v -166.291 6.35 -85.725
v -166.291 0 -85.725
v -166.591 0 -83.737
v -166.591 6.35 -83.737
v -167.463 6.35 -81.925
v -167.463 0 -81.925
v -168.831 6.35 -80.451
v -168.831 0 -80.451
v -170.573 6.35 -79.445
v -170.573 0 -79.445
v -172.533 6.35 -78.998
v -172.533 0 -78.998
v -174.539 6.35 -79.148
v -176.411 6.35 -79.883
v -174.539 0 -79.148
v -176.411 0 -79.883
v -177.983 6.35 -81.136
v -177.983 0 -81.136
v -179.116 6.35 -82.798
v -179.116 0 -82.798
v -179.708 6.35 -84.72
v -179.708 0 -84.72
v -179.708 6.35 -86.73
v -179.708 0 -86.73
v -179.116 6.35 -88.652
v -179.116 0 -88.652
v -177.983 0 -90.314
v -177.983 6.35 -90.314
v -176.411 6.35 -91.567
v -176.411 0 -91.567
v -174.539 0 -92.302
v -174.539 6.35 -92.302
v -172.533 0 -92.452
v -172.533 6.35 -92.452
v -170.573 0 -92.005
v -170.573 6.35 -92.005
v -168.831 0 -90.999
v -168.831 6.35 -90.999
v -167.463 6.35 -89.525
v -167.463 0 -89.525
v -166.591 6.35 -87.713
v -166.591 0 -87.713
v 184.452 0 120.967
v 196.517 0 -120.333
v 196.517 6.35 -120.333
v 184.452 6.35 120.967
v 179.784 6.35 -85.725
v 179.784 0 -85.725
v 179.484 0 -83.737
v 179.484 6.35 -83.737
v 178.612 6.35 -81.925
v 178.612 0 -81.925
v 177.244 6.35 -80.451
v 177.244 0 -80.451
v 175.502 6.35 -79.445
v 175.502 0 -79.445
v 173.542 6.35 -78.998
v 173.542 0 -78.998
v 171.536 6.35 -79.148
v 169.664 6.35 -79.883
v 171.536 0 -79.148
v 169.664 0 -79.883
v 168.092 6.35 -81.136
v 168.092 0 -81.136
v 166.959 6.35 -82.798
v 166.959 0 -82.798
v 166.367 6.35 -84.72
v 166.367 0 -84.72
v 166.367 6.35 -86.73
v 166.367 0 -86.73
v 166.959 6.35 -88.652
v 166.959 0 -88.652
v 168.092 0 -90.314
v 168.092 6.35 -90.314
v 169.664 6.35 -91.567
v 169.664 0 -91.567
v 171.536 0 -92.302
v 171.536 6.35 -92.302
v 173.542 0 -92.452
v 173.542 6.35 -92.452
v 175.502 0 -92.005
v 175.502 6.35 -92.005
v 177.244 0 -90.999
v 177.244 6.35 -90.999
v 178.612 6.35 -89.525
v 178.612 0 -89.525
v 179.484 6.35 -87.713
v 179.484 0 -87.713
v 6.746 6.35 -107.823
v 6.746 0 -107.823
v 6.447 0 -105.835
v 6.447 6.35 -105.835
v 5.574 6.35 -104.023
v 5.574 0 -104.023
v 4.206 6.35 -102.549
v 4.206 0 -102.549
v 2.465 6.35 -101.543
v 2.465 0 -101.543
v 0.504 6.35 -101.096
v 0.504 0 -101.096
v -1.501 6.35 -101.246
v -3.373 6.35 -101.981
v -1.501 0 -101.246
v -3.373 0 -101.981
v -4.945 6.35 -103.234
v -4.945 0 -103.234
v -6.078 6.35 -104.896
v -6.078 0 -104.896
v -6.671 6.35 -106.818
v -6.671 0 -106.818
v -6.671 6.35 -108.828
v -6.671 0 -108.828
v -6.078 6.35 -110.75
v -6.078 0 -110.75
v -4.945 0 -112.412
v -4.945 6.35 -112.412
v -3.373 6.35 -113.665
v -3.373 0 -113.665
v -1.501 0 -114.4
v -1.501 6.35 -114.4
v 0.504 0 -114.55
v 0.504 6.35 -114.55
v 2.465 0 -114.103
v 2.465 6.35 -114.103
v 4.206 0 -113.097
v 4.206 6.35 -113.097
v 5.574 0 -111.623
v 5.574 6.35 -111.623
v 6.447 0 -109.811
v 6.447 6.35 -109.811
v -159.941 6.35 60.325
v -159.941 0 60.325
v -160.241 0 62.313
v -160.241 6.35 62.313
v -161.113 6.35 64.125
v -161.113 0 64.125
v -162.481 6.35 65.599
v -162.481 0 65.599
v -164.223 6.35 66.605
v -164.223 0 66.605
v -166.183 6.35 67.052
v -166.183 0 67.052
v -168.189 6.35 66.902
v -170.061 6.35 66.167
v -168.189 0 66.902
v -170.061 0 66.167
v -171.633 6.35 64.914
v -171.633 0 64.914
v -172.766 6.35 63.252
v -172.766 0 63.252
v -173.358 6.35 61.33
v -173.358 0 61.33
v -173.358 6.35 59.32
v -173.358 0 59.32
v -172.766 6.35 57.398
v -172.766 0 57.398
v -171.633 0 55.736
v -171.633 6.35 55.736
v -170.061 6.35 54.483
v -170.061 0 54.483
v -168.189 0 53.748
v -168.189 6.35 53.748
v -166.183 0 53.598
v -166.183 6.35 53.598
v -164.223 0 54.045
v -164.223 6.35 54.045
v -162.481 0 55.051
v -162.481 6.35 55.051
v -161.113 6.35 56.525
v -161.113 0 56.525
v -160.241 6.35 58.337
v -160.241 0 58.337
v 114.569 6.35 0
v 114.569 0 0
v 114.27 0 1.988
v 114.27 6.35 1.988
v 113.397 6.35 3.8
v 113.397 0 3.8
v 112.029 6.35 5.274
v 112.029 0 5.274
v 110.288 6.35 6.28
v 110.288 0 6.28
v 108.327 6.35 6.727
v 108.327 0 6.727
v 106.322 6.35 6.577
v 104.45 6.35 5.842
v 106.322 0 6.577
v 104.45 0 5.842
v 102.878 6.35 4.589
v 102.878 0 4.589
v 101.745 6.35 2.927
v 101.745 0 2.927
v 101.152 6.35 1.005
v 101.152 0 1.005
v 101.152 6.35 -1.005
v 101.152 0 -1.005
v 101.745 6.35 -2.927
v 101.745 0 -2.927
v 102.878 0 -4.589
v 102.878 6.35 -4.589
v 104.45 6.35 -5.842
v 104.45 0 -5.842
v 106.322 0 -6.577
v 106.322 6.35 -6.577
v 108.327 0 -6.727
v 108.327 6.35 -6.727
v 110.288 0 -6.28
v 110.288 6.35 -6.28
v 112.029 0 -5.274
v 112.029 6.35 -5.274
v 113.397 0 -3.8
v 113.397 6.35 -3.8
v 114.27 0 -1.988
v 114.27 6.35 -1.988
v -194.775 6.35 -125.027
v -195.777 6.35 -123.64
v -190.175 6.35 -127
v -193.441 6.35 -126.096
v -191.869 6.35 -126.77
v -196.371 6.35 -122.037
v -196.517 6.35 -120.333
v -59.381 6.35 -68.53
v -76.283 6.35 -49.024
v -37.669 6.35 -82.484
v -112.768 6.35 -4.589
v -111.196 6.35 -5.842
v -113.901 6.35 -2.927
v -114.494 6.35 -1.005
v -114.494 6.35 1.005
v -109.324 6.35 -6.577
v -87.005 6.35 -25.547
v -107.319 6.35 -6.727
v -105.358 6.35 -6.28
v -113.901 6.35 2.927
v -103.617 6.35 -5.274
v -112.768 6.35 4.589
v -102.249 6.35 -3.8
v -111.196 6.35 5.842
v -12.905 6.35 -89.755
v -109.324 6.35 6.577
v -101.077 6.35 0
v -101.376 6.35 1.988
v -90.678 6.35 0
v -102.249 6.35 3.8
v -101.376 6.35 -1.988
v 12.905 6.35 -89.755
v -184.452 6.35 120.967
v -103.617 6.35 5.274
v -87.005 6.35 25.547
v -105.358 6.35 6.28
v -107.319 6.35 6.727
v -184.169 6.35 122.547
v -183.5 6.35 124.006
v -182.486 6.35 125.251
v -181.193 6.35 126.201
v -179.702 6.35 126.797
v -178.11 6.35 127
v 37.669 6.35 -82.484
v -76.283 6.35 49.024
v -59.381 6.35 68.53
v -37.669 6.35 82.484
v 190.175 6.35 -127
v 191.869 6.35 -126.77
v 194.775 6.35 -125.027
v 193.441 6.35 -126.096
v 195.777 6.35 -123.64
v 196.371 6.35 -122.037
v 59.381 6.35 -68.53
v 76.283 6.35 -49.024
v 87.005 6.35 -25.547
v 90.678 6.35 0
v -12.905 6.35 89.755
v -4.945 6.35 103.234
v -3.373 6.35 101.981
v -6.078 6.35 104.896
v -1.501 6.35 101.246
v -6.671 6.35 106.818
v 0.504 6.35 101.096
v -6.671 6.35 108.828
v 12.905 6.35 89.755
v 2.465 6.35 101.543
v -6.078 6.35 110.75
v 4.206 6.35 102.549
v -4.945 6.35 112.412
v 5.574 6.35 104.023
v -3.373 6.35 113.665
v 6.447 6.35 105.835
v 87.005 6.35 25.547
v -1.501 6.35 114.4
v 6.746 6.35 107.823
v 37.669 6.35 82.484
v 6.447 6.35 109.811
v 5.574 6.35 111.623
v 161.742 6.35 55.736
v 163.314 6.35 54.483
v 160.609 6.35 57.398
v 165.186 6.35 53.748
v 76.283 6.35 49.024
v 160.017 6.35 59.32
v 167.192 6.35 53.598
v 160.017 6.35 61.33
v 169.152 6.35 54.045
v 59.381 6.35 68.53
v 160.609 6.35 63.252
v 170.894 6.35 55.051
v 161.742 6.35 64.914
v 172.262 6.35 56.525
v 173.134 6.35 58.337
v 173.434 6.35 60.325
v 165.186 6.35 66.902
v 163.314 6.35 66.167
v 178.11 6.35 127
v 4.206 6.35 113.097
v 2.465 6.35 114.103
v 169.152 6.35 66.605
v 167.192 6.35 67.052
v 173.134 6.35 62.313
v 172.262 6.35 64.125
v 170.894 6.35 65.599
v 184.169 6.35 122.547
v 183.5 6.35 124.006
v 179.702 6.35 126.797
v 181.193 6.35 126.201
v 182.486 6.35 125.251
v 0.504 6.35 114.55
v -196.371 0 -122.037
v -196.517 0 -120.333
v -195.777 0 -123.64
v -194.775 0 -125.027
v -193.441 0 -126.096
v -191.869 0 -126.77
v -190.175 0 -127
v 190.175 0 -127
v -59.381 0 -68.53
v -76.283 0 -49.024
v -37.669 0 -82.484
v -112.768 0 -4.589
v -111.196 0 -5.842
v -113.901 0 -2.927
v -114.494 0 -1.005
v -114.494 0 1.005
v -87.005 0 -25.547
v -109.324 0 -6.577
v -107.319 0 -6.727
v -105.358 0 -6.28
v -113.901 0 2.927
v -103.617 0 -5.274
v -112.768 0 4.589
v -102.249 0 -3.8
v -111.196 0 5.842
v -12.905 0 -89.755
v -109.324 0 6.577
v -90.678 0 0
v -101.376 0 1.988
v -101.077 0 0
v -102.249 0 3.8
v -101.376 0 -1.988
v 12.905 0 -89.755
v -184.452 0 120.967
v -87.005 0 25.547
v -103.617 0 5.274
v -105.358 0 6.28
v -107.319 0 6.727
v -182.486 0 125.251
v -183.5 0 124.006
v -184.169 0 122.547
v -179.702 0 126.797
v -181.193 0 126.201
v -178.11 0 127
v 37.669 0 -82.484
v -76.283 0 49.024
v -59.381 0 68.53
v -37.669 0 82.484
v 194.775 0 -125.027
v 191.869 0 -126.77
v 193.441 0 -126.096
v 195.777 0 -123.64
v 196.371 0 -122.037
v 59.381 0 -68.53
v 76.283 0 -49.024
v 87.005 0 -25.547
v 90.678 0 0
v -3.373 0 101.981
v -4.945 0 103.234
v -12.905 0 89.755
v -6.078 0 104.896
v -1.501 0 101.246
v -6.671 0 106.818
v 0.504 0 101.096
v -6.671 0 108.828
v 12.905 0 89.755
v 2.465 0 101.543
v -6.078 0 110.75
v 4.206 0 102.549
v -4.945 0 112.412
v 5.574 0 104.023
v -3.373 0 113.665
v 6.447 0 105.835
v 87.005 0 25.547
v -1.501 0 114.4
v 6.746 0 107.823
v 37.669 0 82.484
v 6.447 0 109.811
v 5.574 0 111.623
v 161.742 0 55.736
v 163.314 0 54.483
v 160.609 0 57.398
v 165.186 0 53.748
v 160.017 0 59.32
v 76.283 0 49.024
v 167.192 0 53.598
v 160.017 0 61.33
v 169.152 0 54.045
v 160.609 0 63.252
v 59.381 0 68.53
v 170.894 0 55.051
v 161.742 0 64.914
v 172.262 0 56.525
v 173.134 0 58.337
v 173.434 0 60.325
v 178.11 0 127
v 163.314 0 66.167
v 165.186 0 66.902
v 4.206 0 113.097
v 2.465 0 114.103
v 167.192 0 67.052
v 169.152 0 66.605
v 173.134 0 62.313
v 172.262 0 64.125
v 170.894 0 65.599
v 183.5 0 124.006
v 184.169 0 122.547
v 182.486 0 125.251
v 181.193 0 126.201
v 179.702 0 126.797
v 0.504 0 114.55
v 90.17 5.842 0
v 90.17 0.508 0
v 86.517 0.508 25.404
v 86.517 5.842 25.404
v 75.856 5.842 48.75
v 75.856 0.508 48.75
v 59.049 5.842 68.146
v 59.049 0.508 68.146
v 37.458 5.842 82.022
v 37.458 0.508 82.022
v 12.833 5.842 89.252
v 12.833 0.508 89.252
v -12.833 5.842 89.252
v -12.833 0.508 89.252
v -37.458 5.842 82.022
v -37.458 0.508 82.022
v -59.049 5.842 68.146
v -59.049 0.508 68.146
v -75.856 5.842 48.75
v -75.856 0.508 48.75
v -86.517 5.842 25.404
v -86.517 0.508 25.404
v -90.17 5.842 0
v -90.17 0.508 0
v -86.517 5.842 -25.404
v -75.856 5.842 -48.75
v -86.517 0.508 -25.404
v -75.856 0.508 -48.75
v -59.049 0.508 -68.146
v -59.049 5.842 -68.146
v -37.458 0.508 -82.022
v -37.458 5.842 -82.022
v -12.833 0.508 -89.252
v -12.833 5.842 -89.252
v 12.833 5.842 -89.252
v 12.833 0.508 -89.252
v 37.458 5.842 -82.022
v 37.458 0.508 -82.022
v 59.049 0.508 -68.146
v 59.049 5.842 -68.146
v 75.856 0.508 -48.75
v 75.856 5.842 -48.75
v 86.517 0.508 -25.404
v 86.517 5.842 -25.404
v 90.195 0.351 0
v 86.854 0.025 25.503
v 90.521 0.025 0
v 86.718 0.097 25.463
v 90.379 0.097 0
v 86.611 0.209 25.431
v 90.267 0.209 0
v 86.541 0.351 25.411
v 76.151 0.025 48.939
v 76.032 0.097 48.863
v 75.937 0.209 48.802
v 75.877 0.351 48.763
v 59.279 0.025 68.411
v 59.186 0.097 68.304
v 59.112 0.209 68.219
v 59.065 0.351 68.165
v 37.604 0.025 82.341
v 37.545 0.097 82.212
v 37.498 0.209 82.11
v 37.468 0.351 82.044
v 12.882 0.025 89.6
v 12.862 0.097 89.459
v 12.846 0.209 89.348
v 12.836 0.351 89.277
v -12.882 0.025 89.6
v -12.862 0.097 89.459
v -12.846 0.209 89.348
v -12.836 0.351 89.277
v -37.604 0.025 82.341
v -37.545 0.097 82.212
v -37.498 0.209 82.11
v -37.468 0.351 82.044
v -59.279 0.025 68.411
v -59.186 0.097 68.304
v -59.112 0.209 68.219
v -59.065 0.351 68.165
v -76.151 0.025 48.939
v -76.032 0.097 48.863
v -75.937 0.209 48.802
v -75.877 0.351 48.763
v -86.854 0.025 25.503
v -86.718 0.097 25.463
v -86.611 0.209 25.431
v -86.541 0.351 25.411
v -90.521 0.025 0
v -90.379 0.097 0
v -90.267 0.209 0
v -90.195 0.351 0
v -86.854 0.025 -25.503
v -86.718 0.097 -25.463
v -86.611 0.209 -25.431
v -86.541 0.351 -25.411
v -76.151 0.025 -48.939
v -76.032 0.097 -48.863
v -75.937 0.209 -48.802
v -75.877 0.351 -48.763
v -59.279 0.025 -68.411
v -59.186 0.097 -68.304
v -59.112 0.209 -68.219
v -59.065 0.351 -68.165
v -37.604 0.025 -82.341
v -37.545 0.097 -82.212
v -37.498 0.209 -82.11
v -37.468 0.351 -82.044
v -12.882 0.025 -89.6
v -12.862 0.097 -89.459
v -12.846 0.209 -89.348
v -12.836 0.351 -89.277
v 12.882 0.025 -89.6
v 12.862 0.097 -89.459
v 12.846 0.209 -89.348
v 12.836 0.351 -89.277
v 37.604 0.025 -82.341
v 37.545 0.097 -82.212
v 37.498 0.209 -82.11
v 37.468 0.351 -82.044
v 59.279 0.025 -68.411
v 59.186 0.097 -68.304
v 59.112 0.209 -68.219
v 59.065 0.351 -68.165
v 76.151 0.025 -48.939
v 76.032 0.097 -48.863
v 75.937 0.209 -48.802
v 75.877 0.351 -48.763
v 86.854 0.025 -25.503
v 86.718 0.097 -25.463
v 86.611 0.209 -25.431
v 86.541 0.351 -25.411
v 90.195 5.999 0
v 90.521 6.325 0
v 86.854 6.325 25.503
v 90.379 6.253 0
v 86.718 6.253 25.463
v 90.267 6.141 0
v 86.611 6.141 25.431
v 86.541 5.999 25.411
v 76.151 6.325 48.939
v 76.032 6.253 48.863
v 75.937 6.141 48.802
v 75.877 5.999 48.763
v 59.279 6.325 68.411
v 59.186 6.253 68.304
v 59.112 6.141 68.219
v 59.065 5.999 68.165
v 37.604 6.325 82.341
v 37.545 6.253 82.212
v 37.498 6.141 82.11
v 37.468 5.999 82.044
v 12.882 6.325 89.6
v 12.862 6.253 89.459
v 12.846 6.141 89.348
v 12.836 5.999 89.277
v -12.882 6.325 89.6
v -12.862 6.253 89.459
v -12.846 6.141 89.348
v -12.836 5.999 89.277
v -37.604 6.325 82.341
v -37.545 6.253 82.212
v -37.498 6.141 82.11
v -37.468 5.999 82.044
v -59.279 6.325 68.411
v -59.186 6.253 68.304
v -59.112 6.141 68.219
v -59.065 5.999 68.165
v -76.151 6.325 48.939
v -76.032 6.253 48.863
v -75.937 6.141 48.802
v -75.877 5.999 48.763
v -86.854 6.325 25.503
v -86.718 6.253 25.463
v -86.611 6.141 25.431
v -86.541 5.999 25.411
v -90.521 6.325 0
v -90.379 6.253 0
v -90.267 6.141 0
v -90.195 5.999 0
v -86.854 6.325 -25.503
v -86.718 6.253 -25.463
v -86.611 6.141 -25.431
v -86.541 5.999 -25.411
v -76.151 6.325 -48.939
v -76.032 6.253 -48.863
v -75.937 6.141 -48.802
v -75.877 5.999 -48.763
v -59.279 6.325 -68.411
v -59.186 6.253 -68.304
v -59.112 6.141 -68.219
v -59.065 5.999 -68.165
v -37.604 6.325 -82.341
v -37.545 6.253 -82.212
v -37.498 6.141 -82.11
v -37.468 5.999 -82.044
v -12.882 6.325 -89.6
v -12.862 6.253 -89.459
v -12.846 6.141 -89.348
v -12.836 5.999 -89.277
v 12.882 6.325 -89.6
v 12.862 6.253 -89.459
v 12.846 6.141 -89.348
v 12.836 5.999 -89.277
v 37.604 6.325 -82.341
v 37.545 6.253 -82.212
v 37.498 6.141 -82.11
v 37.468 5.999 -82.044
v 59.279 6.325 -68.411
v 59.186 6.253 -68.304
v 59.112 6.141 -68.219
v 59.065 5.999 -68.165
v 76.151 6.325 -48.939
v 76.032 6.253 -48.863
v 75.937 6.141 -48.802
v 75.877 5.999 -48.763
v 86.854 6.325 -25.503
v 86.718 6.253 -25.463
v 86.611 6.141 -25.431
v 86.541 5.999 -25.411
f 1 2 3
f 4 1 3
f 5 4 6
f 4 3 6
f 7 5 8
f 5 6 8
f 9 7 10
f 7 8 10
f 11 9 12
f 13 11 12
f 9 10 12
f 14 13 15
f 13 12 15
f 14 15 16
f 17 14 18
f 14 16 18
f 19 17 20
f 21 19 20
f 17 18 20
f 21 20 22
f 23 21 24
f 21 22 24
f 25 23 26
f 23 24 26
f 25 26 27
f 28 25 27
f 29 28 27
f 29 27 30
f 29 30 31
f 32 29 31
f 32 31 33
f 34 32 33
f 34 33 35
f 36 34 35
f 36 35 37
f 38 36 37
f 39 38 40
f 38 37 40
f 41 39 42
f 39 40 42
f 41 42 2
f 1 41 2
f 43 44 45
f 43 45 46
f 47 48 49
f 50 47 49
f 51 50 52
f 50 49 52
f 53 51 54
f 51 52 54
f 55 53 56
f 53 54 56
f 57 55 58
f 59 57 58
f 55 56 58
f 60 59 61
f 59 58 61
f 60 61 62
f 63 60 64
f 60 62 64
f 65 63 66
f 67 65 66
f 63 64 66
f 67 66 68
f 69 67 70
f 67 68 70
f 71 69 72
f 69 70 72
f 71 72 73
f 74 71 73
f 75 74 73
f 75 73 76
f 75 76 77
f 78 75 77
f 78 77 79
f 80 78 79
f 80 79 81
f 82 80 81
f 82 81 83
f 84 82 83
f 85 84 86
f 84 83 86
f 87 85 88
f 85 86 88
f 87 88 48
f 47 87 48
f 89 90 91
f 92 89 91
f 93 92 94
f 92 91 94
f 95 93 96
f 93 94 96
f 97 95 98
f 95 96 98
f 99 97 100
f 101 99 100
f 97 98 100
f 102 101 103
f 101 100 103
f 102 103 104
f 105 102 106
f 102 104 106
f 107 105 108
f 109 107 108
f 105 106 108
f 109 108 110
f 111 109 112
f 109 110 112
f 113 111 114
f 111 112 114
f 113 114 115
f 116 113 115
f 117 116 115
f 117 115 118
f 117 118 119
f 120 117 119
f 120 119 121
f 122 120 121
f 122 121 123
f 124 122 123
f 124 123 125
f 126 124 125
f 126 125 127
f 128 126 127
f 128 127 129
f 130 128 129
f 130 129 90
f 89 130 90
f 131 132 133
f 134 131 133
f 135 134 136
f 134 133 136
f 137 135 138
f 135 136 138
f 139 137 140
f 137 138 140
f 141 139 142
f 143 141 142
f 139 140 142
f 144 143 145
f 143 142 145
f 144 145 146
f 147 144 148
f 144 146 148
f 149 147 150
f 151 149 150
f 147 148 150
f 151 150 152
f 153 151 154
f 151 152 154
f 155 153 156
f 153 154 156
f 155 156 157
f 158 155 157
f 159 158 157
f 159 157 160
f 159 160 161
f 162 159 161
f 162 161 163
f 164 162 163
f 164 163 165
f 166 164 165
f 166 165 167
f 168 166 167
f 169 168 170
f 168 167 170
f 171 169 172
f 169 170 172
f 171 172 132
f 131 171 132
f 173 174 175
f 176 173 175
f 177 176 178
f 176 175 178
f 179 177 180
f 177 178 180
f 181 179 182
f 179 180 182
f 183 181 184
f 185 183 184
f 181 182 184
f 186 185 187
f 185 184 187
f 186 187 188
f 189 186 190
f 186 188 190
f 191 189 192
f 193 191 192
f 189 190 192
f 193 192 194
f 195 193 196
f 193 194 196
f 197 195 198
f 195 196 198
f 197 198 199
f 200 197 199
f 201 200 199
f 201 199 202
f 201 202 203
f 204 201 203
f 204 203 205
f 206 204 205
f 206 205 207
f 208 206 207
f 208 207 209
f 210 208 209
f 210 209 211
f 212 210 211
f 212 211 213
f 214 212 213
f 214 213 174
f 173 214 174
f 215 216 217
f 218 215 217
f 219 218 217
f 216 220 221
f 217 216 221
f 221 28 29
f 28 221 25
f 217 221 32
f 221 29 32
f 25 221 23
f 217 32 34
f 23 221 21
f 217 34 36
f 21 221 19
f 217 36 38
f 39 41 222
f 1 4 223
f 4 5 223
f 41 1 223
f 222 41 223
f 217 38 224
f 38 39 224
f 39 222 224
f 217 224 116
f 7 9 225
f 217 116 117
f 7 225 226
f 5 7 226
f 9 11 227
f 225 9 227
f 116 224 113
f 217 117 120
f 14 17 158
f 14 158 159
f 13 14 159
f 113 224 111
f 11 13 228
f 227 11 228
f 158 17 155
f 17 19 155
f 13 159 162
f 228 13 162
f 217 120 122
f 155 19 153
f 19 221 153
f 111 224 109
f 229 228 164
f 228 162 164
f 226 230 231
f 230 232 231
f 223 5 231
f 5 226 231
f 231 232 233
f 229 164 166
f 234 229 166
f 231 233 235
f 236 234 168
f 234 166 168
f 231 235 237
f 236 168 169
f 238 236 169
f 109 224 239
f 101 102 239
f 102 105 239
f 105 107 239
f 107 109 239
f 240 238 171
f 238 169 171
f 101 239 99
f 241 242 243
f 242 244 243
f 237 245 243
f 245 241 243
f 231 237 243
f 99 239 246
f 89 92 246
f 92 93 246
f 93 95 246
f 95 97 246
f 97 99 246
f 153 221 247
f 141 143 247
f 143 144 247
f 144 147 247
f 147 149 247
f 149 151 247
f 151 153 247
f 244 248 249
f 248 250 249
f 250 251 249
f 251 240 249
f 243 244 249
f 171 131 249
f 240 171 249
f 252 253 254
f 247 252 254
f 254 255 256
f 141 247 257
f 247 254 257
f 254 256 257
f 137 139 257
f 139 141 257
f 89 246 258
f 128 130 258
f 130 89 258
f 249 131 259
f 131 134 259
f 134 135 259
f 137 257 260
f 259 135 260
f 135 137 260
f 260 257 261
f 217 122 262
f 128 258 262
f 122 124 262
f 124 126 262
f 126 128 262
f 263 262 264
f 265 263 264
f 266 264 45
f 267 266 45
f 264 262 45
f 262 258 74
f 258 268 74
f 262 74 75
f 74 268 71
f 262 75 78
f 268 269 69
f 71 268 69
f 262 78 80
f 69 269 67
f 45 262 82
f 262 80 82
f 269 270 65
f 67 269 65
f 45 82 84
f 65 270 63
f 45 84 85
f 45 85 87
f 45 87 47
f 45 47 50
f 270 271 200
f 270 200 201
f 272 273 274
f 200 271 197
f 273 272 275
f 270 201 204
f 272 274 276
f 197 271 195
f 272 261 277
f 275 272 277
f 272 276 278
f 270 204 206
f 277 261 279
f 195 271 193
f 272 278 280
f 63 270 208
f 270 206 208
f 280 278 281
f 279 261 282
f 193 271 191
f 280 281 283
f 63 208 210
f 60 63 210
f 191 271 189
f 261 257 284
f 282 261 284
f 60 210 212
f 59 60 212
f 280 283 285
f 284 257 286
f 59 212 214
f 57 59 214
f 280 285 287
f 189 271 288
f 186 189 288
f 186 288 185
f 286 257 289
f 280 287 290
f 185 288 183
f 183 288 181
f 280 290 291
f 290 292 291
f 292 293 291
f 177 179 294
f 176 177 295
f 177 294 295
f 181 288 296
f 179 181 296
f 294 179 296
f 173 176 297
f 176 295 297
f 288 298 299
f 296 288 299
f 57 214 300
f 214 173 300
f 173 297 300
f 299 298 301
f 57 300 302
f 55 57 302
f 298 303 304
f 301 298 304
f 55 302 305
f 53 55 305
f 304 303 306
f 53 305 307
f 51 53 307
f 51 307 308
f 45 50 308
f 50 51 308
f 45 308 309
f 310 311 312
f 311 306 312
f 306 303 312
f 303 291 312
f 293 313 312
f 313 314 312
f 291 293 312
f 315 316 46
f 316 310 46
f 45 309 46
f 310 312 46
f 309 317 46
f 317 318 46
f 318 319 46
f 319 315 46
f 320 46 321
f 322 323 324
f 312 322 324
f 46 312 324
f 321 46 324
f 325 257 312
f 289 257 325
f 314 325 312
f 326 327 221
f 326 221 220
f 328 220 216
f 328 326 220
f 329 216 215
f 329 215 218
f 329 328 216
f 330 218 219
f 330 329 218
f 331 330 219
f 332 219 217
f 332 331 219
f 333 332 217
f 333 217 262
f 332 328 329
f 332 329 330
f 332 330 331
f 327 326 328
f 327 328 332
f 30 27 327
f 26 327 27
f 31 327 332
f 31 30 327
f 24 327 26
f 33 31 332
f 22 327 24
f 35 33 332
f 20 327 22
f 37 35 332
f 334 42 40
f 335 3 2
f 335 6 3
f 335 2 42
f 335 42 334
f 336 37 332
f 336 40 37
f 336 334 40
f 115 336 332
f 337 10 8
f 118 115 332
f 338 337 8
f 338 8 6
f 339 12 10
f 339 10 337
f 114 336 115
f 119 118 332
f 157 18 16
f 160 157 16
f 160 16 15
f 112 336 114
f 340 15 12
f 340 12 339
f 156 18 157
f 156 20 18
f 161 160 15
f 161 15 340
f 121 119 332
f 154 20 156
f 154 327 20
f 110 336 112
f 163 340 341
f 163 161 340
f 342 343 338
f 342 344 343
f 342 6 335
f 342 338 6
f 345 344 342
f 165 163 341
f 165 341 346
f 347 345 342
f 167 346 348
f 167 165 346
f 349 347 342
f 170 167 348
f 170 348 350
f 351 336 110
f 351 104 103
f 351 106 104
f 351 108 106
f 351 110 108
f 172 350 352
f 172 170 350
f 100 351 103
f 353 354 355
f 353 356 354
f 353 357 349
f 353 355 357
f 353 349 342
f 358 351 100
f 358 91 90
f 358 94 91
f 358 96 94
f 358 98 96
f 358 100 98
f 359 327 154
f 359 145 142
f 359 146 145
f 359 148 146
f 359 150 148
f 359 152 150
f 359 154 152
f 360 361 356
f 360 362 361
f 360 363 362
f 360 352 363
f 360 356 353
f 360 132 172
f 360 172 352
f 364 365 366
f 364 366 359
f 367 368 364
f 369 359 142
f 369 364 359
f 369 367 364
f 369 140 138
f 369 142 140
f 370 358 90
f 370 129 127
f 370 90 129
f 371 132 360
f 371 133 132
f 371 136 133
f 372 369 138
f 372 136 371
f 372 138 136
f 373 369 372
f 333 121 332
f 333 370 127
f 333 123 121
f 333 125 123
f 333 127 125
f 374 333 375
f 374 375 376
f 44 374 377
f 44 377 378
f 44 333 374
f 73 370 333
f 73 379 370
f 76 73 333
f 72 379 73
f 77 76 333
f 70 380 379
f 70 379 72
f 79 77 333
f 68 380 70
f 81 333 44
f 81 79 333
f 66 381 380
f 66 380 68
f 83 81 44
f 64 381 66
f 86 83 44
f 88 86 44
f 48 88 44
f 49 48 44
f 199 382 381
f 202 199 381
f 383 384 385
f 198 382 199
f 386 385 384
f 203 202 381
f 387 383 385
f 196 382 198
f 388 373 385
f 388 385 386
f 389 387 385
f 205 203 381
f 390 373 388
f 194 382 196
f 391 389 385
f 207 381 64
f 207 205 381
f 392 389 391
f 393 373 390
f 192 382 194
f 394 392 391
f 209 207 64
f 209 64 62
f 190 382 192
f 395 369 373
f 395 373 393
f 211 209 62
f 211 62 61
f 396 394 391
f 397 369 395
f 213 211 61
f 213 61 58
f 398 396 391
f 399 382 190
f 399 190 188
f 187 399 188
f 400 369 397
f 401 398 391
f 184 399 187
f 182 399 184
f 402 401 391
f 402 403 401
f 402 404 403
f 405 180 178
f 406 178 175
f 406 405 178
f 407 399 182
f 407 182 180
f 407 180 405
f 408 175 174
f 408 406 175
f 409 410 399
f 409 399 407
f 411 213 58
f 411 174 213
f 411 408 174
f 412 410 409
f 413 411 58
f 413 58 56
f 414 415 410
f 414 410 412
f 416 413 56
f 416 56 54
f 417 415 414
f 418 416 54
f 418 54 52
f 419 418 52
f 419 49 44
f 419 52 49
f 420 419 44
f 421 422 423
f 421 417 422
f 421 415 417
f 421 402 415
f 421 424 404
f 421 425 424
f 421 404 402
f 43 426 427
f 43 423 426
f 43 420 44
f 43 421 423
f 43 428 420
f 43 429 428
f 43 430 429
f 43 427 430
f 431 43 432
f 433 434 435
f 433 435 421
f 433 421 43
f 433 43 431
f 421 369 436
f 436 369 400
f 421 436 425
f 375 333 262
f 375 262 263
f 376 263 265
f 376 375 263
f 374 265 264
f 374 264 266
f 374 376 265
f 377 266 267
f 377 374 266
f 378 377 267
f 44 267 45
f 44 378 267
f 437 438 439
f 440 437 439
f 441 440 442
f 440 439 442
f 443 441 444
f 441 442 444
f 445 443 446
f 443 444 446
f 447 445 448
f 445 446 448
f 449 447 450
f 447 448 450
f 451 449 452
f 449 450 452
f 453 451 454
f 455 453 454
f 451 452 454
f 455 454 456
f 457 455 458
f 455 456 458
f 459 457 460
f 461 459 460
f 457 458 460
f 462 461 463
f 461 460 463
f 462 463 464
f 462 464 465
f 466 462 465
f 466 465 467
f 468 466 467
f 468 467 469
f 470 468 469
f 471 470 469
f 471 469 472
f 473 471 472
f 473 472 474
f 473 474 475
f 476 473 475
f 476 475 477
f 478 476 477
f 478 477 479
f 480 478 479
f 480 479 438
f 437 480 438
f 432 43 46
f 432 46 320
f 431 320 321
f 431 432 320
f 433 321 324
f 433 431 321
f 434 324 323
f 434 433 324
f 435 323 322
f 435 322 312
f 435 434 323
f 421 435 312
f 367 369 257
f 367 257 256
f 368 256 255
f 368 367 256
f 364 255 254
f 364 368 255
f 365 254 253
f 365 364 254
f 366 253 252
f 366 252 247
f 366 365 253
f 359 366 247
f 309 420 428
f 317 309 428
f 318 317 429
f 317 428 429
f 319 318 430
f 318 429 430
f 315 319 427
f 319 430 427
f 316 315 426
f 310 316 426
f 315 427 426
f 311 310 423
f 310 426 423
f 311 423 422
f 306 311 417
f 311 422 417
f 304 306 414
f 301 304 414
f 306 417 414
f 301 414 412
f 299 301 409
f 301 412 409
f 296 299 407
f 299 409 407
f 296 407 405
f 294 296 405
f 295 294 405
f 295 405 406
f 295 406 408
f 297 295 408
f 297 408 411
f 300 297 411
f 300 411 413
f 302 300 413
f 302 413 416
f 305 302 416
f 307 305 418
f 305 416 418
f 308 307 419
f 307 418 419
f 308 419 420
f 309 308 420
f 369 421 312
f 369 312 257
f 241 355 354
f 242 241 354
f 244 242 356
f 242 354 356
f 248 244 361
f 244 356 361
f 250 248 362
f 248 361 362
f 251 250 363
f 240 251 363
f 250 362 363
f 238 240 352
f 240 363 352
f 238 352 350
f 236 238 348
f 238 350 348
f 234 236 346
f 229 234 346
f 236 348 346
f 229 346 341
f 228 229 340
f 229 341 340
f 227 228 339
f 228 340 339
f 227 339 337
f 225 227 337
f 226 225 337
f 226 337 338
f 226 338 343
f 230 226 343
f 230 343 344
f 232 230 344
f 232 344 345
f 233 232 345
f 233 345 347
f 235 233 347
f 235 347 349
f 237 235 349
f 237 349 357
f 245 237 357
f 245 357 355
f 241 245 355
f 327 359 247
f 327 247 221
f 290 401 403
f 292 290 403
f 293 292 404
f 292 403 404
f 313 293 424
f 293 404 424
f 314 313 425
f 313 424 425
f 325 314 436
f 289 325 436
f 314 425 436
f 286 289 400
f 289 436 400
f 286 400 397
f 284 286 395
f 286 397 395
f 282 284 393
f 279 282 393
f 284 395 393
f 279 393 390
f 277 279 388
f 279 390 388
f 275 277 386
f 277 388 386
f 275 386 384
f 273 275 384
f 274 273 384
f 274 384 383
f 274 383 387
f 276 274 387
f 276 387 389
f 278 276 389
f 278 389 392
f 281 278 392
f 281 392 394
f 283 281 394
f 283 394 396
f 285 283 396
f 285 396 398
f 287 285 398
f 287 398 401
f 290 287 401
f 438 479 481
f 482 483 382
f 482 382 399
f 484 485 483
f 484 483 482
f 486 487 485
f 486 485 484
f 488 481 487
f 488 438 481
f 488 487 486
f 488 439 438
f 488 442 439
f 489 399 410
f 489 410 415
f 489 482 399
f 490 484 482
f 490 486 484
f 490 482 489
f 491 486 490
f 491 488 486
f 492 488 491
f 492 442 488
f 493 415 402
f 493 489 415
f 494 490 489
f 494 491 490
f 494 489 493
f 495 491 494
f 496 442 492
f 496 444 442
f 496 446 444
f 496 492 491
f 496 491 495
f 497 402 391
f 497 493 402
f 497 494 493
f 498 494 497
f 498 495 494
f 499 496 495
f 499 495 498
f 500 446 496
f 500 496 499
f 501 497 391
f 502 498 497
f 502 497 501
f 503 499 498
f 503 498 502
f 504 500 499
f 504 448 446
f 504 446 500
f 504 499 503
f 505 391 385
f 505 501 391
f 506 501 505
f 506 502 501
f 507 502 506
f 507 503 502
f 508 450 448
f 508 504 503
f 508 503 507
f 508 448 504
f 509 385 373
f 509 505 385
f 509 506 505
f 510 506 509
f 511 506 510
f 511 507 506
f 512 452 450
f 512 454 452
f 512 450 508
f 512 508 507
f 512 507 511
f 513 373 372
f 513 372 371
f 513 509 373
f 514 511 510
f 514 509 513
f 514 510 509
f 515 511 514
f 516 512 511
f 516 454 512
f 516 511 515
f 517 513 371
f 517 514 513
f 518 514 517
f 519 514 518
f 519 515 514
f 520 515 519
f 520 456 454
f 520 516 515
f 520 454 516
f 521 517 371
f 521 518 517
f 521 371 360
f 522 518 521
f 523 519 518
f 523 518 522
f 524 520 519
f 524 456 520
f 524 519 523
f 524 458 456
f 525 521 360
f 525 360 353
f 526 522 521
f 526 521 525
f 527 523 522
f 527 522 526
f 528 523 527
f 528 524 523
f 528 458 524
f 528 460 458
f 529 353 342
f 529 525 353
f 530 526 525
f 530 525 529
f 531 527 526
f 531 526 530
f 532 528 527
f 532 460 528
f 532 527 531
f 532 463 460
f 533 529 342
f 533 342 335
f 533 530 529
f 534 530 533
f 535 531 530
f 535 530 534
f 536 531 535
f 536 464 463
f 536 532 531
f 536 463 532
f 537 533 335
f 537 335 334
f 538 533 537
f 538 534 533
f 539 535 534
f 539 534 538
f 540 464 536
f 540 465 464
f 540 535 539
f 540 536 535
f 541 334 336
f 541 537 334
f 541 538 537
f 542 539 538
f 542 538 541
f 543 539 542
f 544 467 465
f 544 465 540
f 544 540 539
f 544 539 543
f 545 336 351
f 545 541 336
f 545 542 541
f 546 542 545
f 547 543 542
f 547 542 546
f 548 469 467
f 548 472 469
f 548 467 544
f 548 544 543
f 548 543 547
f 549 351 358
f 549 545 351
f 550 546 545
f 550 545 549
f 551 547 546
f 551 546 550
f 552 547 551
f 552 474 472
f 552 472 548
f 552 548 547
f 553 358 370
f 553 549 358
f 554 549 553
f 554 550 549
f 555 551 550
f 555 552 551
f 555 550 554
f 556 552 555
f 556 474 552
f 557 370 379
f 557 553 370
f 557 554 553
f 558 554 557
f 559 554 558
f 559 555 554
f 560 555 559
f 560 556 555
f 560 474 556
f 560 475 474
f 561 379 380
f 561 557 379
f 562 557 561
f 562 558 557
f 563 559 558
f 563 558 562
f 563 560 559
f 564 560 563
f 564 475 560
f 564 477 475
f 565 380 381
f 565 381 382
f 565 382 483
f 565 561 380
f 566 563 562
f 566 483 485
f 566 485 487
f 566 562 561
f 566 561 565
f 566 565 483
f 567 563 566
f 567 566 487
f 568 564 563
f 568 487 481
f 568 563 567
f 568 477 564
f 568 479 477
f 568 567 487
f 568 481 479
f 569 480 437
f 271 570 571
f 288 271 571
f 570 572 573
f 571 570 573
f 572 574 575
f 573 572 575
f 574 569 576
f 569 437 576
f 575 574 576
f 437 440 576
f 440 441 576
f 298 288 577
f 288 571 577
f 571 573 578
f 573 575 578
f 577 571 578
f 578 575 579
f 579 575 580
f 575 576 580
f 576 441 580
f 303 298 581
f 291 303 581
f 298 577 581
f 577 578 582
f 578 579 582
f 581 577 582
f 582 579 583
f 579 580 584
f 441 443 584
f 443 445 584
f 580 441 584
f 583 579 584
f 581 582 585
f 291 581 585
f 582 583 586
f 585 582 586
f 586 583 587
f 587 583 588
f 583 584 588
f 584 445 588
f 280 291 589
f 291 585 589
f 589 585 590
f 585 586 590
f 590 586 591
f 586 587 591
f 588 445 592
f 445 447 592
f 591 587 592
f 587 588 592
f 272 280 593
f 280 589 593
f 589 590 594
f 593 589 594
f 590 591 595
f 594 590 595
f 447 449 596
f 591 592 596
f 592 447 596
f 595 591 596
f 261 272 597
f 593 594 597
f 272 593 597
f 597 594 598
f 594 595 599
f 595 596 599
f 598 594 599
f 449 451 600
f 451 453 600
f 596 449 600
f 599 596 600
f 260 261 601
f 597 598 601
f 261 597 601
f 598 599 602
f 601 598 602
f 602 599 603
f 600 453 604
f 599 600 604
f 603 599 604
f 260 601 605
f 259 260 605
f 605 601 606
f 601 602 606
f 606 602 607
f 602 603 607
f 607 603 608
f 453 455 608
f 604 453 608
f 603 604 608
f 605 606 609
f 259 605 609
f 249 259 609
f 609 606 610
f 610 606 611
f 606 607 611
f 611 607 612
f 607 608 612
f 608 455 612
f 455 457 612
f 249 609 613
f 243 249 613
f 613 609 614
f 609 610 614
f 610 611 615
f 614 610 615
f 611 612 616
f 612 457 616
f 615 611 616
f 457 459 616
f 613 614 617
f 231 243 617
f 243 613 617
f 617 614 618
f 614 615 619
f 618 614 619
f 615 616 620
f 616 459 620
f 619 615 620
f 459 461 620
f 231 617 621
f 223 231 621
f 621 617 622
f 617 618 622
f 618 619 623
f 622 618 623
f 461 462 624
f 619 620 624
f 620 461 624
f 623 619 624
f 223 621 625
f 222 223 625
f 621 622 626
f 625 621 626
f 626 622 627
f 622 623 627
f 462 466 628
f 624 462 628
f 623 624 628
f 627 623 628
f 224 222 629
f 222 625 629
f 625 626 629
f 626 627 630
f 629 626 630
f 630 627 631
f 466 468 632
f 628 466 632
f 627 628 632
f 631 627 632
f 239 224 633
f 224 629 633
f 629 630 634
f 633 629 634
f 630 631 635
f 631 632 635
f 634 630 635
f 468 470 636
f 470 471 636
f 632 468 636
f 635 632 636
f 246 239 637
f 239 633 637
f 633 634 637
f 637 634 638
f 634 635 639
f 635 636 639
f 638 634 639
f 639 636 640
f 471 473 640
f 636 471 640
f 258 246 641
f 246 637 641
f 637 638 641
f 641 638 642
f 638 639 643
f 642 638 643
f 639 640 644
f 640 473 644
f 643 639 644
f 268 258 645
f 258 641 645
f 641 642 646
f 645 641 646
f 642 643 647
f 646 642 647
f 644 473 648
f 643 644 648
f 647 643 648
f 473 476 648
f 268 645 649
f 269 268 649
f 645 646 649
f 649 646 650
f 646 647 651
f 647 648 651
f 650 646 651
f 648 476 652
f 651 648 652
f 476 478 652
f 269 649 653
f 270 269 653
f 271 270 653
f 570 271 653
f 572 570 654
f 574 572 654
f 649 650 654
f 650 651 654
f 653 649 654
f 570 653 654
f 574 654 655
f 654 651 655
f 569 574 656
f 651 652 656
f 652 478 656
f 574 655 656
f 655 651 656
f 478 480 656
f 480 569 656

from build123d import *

# Parameters (mm, degrees)
F0_R     = 6.74624
F1_DEPTH = 6.35
F2_R     = 90.17
F3_DEPTH = 6.351
F4_R     = 6.74624
F5_DEPTH = 6.351
F6_R     = 0.508


with BuildPart() as f1:
    # F0 (on Front) → F1 (new body)
    with BuildSketch(Plane.XZ):
        with BuildLine():
            ThreePointArc((-196.5166448066, -120.3328961324), (-194.775442891, -125.0265791688), (-190.1745674547, -127))
            Line((-190.1745674547, -127), (190.1745674547, -127))
            ThreePointArc((190.1745674547, -127), (194.775442891, -125.0265791688), (196.5166448066, -120.3328961324))
            Line((196.5166448066, -120.3328961324), (184.4516448066, 120.9671038676))
            ThreePointArc((184.4516448066, 120.9671038676), (182.4861466235, 125.2508754362), (178.1095674547, 127))
            Line((178.1095674547, 127), (-178.1095674547, 127))
            ThreePointArc((-178.1095674547, 127), (-182.4861466235, 125.2508754362), (-184.4516448066, 120.9671038676))
            Line((-184.4516448066, 120.9671038676), (-196.5166448066, -120.3328961324))
        make_face()
        with Locations((-173.0375, -85.725)):
            Circle(F0_R, mode=Mode.SUBTRACT)
        with Locations((173.0375, -85.725)):
            Circle(F0_R, mode=Mode.SUBTRACT)
        with Locations((-166.6875, 60.325)):
            Circle(F0_R, mode=Mode.SUBTRACT)
        with Locations((166.6875, 60.325)):
            Circle(F0_R, mode=Mode.SUBTRACT)
    extrude(amount=-F1_DEPTH)

    # F2 (on face) → F3 (cut, through all)
    with BuildSketch(Plane.XZ):
        Circle(F2_R)
    extrude(amount=-F3_DEPTH, mode=Mode.SUBTRACT)

    # F4 (on face) → F5 (cut, through all)
    with BuildSketch(Plane.XZ):
        with Locations((0, 107.823)):
            Circle(F4_R)
        with Locations((-107.823, 0)):
            Circle(F4_R)
        with Locations((0, -107.823)):
            Circle(F4_R)
        with Locations((107.823, 0)):
            Circle(F4_R)
    extrude(amount=-F5_DEPTH, mode=Mode.SUBTRACT)

    # F6
    f6_edges = [f1.edges().sort_by_distance(p)[0] for p in [
        (-90.17, 6.35, 0),
        (-90.17, 0, 0),
    ]]
    fillet(f6_edges, radius=F6_R)


solid = f1.part
